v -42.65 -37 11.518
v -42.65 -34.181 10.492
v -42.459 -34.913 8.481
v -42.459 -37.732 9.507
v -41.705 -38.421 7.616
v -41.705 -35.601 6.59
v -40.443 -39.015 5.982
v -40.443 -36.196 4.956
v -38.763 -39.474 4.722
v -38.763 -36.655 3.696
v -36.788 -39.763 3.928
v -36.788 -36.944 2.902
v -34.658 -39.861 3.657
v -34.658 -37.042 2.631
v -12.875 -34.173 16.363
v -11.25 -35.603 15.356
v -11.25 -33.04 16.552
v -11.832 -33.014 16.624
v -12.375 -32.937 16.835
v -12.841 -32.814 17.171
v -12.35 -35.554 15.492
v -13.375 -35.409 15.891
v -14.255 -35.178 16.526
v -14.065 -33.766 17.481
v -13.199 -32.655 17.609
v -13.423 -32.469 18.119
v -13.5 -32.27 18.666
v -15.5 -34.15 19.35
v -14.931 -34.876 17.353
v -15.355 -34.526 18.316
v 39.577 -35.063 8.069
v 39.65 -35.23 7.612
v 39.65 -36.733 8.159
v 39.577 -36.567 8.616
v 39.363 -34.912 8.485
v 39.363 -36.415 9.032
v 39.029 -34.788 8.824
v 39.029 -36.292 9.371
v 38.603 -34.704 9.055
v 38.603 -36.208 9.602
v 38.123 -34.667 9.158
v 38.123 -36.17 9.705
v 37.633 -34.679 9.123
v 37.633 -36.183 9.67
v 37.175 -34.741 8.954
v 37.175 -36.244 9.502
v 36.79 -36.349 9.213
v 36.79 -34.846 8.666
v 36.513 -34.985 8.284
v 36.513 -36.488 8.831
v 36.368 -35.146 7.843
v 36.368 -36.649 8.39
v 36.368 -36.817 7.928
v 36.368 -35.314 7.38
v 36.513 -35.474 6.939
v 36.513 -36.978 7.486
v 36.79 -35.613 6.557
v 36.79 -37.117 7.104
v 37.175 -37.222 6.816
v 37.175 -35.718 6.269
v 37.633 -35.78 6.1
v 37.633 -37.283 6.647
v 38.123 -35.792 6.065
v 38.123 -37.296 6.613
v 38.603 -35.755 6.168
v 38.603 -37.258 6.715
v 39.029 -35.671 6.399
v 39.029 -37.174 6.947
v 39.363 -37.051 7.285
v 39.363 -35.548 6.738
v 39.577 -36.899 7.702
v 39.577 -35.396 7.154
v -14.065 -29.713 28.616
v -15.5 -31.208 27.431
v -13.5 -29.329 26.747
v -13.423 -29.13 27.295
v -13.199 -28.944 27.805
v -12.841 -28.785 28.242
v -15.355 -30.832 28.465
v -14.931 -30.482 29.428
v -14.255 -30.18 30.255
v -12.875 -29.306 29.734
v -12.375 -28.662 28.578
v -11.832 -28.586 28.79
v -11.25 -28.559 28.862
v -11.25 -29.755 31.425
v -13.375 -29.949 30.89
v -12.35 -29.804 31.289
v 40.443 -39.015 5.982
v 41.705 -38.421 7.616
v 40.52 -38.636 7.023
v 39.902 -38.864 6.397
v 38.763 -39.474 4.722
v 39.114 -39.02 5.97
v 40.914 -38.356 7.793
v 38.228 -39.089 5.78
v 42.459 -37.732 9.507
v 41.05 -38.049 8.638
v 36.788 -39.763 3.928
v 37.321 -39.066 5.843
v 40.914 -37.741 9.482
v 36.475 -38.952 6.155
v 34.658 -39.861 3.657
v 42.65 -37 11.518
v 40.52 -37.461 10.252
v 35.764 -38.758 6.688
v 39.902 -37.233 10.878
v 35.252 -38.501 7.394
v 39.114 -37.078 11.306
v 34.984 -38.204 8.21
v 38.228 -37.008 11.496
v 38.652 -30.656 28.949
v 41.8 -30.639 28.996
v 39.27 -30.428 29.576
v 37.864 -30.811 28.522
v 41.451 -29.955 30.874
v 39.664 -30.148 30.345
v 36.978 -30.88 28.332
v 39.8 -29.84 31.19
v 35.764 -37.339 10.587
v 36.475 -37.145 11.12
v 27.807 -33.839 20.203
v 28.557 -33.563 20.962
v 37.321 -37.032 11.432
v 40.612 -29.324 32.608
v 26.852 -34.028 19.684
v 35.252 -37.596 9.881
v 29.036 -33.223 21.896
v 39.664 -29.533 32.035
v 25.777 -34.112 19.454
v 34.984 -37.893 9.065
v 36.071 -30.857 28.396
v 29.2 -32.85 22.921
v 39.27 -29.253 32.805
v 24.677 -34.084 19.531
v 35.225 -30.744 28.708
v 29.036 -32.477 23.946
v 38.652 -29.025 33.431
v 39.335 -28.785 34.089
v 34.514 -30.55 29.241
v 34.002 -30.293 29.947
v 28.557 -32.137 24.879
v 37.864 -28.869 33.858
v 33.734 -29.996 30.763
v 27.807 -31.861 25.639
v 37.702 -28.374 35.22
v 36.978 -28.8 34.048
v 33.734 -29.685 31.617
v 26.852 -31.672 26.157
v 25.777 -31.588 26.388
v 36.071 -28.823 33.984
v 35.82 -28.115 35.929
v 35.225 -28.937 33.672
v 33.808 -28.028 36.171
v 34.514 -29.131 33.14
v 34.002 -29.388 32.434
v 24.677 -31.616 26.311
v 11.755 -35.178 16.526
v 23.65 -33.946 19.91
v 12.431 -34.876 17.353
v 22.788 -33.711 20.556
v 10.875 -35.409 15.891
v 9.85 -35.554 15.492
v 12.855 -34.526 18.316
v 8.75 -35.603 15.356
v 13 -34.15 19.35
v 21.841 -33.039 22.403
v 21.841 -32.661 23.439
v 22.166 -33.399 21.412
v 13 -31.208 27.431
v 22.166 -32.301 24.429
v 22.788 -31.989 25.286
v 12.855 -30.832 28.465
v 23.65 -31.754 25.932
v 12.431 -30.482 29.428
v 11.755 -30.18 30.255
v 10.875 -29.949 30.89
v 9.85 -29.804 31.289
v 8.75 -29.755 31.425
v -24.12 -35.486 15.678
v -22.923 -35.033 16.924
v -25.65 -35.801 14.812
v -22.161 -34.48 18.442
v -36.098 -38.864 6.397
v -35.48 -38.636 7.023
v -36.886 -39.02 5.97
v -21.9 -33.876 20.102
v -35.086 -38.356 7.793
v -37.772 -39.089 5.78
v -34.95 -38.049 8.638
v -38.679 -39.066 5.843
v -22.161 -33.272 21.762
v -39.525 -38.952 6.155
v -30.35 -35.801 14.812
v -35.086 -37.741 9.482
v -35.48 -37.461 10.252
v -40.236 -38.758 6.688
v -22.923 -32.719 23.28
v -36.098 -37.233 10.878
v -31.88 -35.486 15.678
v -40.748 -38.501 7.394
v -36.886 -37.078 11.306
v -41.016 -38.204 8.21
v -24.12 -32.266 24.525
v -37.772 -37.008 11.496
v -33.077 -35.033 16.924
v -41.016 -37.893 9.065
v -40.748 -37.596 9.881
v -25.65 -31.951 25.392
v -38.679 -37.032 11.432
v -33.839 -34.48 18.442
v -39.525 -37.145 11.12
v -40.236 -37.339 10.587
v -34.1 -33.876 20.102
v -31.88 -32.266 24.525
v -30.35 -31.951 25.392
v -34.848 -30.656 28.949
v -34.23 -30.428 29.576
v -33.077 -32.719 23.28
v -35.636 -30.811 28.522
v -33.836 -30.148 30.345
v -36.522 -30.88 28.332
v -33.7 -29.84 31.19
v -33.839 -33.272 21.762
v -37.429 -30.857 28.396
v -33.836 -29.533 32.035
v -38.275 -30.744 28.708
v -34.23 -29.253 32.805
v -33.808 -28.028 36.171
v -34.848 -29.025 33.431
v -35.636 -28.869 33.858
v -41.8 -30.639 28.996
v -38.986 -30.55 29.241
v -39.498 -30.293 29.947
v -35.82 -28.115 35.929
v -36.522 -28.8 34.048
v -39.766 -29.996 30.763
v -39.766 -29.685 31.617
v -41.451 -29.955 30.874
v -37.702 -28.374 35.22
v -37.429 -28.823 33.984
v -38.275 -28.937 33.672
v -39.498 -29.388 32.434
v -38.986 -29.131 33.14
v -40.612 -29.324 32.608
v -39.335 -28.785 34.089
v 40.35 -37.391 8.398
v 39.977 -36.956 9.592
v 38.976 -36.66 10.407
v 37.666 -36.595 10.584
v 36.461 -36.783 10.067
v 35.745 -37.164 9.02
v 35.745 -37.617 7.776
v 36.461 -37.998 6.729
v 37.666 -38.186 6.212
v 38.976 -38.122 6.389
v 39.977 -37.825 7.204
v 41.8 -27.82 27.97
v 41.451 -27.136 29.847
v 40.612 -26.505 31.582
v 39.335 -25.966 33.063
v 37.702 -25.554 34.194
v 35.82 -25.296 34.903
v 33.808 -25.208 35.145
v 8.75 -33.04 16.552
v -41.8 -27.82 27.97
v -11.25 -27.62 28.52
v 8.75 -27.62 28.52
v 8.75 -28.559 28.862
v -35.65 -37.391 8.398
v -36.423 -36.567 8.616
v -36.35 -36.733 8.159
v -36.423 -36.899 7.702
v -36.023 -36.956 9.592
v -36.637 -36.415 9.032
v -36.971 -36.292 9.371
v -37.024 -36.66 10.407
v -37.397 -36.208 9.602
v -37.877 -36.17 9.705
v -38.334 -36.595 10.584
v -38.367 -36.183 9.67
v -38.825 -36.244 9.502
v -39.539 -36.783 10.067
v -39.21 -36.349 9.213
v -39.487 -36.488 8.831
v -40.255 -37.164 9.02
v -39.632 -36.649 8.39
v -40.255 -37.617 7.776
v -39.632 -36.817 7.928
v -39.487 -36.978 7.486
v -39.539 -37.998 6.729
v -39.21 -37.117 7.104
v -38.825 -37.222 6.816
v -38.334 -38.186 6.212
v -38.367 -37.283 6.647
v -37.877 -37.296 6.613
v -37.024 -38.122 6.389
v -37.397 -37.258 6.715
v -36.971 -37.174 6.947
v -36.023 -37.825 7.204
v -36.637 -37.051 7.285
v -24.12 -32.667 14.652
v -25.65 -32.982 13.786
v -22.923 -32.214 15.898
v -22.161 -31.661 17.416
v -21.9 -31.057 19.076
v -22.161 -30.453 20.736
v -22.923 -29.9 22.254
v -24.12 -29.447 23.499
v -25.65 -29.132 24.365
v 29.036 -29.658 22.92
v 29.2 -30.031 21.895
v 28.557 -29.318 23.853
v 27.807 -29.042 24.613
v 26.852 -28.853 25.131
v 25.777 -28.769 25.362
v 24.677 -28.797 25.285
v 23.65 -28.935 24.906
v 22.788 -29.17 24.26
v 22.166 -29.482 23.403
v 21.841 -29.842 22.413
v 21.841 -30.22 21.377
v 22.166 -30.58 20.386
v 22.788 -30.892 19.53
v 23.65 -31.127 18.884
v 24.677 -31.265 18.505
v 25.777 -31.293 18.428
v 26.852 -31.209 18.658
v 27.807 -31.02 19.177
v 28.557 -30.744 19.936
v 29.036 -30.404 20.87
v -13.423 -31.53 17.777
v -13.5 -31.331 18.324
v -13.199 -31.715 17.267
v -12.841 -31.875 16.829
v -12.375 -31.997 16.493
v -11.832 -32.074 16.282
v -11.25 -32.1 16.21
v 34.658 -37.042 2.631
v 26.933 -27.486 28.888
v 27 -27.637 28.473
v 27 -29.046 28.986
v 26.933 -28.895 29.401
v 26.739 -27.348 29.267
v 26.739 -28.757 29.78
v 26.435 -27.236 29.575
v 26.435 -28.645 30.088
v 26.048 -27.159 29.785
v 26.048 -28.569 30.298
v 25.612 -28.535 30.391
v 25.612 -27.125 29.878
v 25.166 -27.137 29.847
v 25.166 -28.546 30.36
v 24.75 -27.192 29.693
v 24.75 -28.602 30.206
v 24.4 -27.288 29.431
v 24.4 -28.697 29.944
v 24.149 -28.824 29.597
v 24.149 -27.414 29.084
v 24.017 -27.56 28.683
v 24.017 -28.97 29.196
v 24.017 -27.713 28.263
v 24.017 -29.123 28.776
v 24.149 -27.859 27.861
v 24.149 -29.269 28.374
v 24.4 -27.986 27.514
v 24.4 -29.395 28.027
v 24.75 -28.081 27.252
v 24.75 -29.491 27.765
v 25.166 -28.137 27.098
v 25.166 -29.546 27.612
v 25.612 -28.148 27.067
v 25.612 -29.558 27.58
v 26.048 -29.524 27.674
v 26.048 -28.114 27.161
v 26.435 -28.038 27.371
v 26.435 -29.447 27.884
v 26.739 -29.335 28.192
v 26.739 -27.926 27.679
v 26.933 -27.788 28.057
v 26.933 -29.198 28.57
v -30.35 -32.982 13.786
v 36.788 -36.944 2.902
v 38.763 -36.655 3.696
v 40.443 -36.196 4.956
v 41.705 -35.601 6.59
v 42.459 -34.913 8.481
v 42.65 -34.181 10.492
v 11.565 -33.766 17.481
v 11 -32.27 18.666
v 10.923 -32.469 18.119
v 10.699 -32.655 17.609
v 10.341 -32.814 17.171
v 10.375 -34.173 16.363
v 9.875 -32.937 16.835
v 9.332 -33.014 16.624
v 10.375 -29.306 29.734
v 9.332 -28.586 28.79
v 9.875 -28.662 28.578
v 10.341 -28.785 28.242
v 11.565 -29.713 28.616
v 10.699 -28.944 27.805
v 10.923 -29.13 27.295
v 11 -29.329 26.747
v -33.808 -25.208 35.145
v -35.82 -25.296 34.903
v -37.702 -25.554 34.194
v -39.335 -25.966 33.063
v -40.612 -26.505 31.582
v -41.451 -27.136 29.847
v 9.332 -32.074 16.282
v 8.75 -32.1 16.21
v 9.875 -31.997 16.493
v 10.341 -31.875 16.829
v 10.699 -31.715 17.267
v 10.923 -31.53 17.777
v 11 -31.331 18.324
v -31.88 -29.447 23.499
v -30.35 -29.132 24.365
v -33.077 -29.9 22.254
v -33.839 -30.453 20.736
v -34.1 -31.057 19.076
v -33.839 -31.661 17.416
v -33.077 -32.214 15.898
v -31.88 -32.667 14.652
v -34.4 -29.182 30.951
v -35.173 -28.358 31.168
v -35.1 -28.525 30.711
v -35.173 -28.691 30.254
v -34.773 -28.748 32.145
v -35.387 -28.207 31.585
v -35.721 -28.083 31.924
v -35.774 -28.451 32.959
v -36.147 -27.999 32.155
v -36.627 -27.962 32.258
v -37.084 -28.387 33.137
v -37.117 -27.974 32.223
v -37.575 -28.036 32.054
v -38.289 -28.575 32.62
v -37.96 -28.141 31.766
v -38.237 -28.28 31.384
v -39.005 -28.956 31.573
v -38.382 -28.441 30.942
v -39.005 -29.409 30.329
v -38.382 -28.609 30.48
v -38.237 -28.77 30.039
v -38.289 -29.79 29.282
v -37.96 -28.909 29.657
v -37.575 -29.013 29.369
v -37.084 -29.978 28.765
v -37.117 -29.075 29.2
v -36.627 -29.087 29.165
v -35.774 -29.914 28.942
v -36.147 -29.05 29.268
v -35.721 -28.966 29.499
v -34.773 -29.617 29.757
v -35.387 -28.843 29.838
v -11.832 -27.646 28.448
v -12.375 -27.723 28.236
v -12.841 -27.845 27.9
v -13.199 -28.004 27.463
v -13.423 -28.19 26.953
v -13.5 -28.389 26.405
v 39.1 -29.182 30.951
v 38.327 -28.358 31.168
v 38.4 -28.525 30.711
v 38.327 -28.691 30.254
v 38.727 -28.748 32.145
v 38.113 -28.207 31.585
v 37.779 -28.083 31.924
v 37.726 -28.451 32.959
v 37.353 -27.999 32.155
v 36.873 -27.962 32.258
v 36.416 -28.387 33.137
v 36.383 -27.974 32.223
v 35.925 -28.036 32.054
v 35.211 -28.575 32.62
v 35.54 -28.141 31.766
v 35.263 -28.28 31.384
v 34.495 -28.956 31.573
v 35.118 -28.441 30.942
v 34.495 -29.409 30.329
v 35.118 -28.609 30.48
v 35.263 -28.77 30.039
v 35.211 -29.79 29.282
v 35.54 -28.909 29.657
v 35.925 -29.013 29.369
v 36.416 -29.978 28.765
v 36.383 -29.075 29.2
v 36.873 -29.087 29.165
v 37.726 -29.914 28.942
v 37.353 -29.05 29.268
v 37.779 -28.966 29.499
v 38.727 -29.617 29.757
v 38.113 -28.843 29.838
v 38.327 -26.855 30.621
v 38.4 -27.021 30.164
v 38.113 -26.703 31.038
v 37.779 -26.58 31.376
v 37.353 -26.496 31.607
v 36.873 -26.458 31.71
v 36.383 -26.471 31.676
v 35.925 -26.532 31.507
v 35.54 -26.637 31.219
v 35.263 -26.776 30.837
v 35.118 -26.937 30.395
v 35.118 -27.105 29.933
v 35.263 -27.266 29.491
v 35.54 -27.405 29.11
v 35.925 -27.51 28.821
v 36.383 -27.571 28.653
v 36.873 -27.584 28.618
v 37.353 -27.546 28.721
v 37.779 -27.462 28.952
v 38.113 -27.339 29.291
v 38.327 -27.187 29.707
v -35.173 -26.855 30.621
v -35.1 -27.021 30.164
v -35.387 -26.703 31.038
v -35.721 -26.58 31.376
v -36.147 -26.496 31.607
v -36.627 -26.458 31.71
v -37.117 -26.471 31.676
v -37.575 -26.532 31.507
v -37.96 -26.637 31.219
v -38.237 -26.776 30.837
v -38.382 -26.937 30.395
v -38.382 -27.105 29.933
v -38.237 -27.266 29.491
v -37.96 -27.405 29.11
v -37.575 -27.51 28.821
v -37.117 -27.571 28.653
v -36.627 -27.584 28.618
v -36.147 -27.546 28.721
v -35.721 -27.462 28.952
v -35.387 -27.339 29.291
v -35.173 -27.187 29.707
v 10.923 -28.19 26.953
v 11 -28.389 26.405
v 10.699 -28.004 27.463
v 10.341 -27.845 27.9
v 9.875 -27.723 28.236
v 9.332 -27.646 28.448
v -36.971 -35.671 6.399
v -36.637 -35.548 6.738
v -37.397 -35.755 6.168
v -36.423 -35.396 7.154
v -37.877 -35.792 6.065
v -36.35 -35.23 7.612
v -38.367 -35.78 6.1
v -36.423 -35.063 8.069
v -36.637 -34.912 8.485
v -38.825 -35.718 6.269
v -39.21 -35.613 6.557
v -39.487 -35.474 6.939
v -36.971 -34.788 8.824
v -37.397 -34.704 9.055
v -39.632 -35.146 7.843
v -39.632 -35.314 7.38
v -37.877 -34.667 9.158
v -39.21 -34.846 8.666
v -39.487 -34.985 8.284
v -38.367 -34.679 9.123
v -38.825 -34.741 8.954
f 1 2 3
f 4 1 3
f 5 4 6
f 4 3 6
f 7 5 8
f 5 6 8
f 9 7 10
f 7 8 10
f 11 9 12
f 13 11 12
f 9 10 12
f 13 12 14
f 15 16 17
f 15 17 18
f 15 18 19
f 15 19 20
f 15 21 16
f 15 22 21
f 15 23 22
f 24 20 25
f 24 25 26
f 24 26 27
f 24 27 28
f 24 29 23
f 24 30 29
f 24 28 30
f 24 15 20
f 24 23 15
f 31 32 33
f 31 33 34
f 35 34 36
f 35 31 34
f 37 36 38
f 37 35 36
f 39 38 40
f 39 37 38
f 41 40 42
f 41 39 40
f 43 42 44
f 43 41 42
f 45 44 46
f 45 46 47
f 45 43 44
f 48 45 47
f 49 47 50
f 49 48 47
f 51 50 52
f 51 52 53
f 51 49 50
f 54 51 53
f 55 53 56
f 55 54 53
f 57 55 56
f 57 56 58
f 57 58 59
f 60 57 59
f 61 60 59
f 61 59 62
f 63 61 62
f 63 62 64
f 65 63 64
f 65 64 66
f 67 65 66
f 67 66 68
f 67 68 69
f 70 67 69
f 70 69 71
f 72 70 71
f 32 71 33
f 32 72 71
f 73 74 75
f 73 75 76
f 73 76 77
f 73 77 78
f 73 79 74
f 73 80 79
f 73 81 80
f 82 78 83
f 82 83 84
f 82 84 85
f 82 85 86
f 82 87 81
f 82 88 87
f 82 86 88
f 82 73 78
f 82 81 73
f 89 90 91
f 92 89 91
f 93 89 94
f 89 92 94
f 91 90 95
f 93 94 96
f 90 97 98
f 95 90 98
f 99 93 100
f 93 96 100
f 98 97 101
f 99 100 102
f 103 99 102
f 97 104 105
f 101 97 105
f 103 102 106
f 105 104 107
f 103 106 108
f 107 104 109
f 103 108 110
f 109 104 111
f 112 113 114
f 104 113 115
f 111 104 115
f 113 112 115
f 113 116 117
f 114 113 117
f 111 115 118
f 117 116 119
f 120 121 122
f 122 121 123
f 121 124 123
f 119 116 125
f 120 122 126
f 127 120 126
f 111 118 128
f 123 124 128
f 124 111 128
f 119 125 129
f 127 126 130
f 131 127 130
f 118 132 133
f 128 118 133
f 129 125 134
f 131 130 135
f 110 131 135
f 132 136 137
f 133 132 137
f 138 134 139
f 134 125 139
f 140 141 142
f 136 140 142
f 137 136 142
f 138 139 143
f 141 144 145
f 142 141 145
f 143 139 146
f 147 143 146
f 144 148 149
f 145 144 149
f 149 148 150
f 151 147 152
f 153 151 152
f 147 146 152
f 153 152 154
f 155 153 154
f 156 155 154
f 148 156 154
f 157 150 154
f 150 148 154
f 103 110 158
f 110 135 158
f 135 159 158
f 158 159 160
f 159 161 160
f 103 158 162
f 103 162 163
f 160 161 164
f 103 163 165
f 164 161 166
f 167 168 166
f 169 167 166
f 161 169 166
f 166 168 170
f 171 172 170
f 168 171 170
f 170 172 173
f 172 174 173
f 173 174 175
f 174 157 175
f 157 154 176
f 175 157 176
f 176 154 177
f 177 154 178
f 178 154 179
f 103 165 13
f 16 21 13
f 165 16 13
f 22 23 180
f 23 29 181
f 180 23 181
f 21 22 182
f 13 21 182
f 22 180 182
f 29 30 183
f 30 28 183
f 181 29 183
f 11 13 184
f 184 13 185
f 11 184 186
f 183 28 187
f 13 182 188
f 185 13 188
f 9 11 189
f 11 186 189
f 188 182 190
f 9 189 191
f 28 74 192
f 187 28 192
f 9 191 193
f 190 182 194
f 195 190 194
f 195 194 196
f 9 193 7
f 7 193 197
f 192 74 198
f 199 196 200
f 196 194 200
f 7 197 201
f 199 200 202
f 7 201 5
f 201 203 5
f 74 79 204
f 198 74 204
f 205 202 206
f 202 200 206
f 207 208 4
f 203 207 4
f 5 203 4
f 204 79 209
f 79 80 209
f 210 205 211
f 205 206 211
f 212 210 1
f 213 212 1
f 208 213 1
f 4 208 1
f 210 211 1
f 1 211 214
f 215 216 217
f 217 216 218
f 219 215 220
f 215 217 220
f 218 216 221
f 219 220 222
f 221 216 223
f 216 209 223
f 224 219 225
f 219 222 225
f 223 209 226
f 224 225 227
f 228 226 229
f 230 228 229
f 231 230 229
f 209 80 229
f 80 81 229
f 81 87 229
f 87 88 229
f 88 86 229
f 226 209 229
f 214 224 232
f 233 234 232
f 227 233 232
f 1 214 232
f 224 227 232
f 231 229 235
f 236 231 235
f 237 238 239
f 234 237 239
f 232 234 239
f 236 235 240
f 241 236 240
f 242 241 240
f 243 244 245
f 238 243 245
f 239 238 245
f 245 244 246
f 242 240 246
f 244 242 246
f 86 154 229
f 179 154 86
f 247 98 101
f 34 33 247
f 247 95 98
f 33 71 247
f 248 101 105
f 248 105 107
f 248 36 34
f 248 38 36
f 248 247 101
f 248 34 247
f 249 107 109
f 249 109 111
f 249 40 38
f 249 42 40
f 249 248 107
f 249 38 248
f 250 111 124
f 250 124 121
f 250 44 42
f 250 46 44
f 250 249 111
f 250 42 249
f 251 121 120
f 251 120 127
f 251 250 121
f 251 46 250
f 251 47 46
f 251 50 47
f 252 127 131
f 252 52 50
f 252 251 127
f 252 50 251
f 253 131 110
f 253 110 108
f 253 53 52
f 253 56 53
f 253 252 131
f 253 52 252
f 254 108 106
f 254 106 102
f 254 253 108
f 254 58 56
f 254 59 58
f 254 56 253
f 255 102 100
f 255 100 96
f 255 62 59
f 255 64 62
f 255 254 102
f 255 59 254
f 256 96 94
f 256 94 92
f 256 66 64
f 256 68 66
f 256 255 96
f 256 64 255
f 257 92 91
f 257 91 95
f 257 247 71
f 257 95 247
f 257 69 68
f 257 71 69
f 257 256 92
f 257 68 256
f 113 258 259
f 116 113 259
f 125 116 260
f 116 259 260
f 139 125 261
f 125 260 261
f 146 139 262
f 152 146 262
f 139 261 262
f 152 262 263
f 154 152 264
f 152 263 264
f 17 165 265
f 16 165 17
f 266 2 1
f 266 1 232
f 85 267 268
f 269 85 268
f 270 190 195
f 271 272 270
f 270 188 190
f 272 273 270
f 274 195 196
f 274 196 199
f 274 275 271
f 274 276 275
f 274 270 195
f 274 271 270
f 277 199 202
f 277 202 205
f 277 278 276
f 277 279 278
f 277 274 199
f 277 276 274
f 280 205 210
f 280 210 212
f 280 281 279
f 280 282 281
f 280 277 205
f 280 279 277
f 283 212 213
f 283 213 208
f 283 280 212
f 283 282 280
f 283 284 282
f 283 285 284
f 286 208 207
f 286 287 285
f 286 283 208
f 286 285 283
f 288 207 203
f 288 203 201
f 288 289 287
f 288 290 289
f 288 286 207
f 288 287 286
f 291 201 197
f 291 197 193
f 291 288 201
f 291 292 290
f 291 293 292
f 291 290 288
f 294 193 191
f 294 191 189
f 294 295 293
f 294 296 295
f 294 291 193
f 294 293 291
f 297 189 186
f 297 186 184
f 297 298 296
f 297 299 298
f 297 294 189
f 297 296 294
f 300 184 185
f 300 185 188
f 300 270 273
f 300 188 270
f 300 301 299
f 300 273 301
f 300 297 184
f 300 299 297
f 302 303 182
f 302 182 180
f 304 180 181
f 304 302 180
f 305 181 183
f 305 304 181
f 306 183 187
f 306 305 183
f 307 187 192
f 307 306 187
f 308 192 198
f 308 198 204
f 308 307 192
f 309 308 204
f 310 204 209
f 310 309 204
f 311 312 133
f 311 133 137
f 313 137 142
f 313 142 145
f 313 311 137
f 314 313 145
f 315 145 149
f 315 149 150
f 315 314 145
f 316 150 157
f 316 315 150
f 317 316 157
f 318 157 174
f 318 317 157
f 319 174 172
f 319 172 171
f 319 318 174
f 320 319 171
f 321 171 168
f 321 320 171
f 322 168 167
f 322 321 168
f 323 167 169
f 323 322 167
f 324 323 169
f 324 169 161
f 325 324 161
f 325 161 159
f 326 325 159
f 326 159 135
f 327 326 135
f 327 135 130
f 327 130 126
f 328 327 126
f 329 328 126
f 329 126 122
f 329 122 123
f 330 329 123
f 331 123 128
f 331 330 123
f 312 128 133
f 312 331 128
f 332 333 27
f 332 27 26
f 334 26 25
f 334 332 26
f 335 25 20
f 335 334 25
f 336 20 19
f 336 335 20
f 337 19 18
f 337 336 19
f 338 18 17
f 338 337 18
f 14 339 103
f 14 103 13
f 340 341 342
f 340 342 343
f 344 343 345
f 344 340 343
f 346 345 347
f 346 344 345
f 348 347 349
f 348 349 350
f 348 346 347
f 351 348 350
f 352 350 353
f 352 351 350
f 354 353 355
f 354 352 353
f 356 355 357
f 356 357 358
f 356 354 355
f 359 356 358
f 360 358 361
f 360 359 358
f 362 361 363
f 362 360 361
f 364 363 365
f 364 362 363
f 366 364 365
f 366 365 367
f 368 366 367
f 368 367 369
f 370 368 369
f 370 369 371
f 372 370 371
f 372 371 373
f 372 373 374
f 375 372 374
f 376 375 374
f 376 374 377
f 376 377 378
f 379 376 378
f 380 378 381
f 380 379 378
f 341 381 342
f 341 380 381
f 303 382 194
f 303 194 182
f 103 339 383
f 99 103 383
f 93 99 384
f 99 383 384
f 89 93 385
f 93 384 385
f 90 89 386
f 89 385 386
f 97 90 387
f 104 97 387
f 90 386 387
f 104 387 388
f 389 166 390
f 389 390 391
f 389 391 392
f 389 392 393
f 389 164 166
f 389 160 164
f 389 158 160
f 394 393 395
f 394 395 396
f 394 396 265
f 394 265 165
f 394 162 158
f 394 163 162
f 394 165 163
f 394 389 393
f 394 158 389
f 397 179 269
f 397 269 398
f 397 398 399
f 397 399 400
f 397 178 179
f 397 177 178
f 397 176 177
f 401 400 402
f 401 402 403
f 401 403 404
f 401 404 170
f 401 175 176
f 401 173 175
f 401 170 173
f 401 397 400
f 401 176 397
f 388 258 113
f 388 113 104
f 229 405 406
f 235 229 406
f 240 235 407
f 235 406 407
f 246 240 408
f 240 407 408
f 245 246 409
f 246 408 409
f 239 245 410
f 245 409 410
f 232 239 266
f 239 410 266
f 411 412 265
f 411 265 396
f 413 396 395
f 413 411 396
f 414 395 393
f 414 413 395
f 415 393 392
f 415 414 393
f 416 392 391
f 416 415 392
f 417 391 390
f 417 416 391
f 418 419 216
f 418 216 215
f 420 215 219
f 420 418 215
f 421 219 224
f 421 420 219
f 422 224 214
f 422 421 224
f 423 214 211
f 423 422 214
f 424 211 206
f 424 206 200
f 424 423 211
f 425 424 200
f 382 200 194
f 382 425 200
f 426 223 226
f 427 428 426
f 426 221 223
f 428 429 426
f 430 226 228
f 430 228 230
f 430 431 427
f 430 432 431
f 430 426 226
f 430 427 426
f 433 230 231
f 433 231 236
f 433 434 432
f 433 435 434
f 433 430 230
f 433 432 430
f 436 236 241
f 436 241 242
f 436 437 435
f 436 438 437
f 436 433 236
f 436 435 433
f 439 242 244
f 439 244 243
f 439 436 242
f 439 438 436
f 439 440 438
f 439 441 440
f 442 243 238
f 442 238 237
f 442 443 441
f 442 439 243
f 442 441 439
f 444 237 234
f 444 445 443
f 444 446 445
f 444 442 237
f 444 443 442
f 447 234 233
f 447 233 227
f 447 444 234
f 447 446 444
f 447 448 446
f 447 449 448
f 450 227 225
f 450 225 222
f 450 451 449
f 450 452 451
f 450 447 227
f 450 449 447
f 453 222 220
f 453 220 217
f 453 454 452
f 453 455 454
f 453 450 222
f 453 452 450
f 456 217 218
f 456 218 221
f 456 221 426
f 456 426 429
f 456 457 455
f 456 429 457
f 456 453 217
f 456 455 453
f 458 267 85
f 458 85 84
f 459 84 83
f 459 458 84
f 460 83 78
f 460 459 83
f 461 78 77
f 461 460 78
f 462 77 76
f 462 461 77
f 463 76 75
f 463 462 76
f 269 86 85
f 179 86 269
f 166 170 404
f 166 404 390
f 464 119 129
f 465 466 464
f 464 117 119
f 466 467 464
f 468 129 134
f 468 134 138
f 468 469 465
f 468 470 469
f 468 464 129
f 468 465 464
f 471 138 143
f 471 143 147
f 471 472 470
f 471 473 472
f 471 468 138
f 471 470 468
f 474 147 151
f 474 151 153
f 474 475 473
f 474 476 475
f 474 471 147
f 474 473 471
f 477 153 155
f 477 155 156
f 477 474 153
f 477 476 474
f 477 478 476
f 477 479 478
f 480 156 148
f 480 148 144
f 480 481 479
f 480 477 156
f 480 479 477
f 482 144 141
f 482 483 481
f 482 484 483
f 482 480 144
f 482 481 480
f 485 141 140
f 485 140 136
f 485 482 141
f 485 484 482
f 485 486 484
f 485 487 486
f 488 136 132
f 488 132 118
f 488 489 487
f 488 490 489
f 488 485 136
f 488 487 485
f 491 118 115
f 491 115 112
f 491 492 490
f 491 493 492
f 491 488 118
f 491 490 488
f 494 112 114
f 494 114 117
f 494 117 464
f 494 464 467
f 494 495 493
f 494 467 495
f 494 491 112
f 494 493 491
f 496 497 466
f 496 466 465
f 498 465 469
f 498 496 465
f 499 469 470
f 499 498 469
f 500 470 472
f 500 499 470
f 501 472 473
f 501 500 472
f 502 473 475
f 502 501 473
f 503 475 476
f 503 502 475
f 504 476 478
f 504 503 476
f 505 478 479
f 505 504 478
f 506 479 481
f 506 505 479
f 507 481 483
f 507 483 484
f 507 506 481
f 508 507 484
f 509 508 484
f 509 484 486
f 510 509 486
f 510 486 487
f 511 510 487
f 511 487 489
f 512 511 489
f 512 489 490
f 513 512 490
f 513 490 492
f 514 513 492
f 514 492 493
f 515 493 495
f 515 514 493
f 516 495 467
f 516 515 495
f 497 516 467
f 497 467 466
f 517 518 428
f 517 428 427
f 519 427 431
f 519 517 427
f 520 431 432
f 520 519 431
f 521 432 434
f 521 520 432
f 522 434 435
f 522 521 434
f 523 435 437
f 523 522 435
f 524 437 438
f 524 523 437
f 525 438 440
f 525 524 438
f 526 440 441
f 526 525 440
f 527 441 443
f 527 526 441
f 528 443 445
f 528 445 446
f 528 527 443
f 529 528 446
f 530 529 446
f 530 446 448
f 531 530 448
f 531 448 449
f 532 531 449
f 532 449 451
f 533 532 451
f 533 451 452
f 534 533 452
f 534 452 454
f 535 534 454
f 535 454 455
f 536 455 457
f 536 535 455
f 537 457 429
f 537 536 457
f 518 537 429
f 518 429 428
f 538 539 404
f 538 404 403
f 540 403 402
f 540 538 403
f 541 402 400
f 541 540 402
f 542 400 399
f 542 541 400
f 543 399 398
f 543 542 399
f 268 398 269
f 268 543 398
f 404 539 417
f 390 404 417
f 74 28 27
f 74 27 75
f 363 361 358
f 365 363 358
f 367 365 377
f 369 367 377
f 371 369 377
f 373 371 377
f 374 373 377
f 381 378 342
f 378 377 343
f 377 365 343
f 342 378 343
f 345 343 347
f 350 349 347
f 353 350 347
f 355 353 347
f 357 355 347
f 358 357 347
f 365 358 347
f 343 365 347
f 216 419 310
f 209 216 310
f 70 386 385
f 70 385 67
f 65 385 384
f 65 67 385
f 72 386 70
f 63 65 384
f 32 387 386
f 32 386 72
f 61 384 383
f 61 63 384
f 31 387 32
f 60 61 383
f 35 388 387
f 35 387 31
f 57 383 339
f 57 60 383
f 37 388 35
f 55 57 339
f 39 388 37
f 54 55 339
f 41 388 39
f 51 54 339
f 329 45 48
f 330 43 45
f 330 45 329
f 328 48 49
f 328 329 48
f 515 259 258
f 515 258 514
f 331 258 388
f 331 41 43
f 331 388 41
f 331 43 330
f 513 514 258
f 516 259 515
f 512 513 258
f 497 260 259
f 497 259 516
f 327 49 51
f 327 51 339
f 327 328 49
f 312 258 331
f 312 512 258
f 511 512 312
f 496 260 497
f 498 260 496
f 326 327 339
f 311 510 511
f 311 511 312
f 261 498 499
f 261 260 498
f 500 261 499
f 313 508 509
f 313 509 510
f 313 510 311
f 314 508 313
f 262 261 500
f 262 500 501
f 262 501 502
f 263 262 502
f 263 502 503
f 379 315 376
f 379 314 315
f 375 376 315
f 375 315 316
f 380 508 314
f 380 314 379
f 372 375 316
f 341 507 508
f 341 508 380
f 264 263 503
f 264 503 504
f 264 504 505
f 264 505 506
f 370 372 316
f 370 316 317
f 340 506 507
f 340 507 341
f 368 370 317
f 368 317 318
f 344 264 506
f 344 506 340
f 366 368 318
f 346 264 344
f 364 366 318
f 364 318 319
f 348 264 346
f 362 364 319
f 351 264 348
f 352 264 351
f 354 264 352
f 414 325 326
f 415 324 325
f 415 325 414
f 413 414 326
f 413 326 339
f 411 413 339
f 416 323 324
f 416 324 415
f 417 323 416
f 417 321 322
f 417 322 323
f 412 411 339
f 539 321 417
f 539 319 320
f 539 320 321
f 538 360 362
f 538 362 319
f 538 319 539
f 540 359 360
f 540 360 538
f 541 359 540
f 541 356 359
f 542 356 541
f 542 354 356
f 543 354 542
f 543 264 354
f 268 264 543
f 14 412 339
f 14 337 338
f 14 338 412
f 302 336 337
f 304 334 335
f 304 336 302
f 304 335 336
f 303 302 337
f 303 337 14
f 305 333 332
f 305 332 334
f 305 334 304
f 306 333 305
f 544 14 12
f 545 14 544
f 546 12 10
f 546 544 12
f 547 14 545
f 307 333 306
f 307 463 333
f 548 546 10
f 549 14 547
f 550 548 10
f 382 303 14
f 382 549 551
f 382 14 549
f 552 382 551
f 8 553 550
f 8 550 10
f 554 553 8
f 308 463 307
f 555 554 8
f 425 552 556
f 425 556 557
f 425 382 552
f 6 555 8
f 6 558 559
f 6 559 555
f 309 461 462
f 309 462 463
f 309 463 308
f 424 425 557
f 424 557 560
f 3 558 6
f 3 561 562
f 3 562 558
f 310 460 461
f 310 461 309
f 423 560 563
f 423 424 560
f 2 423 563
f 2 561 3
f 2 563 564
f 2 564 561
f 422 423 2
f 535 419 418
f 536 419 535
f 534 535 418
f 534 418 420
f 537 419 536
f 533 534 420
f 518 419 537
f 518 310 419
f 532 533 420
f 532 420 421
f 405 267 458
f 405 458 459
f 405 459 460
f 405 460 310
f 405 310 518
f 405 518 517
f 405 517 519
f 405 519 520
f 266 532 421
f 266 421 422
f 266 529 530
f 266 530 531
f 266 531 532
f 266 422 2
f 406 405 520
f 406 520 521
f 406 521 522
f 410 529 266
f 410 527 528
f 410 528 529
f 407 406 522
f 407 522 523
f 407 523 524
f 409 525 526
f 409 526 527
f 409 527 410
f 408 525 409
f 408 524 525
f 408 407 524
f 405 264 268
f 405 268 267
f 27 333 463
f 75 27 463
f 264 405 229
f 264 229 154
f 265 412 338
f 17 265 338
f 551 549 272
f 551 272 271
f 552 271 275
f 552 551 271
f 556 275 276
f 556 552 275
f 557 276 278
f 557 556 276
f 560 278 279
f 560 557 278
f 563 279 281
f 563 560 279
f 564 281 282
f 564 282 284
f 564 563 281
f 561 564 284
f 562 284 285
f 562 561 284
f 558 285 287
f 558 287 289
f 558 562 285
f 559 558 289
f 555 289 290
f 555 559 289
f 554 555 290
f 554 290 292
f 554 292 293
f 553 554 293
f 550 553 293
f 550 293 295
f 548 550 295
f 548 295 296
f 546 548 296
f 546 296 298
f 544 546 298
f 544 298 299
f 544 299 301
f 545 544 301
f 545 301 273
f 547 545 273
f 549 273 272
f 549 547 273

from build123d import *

# Parameters (mm, degrees)
SKETCH033_R             = 1.65
SKETCH033_R_2           = 3.7
PAD001_DEPTH            = 3
CHAMFER001_SIZE         = 2
CHAMFER002_SIZE         = 1.4
SKETCH035_R             = 1.5
POCKET009_DEPTH         = 1.5
BODY005_PLACEMENT_ANGLE = 340


with BuildPart() as part:
    # Sketch033 → Pad001 (new body)
    with BuildSketch(Plane.XZ):
        with BuildLine():
            Line((-33.808366, 37.4), (33.808366, 37.4))
            ThreePointArc((41.8, 29.765194), (39.33458, 35.18452), (33.808366, 37.4))
            Line((41.8, 29.765194), (42.65, 11.165194))
            ThreePointArc((34.658366, 2.8), (40.442878, 5.273779), (42.65, 11.165194))
            Line((34.658366, 2.8), (-34.658366, 2.8))
            ThreePointArc((-42.65, 11.165194), (-40.442878, 5.273779), (-34.658366, 2.8))
            Line((-42.65, 11.165194), (-41.8, 29.765194))
            ThreePointArc((-33.808366, 37.4), (-39.33458, 35.18452), (-41.8, 29.765194))
        make_face()
        with Locations((-36.75, 32.1)):
            Circle(SKETCH033_R, mode=Mode.SUBTRACT)
        with Locations((36.75, 32.1)):
            Circle(SKETCH033_R, mode=Mode.SUBTRACT)
        with Locations((-38, 8.1)):
            Circle(SKETCH033_R, mode=Mode.SUBTRACT)
        with Locations((38, 8.1)):
            Circle(SKETCH033_R, mode=Mode.SUBTRACT)
        with Locations((25.5, 23.3)):
            Circle(SKETCH033_R_2, mode=Mode.SUBTRACT)
        with BuildLine():
            Line((-11.25, 30.35), (8.75, 30.35))
            ThreePointArc((11, 28.1), (10.34099, 29.69099), (8.75, 30.35))
            Line((11, 28.1), (11, 19.5))
            ThreePointArc((8.75, 17.25), (10.34099, 17.90901), (11, 19.5))
            Line((8.75, 17.25), (-11.25, 17.25))
            ThreePointArc((-13.5, 19.5), (-12.84099, 17.90901), (-11.25, 17.25))
            Line((-13.5, 19.5), (-13.5, 28.1))
            ThreePointArc((-11.25, 30.35), (-12.84099, 29.69099), (-13.5, 28.1))
        make_face(mode=Mode.SUBTRACT)
        with BuildLine():
            Line((-30.35, 25.929165), (-25.65, 25.929165))
            ThreePointArc((-25.65, 14.670835), (-21.9, 20.3), (-25.65, 25.929165))
            Line((-30.35, 14.670835), (-25.65, 14.670835))
            ThreePointArc((-30.35, 25.929165), (-34.1, 20.3), (-30.35, 14.670835))
        make_face(mode=Mode.SUBTRACT)
    extrude(amount=PAD001_DEPTH)

    # Chamfer001
    chamfer001_edges = [part.edges().sort_by_distance(p)[0] for p in [
        (-1.25, -3, 30.35),
    ]]
    chamfer(chamfer001_edges, length=CHAMFER001_SIZE)

    # Chamfer002
    chamfer002_edges = [part.edges().sort_by_distance(p)[0] for p in [
        (-38.4, -3, 32.1),
        (-39.65, -3, 8.1),
        (35.1, -3, 32.1),
        (36.35, -3, 8.1),
    ]]
    chamfer(chamfer002_edges, length=CHAMFER002_SIZE)

    # Sketch035 → Pocket009 (cut)
    with BuildSketch(Plane.XZ):
        with Locations((25.5, 30.3)):
            Circle(SKETCH035_R)
    extrude(amount=POCKET009_DEPTH, mode=Mode.SUBTRACT)


with BuildPart() as part_1:
    # Body005 placement: moved
    add(part.part.moved(Location((0, -38, 0))).rotate(Axis((0, -38, 0), (1, 0, 0)), BODY005_PLACEMENT_ANGLE))


solid = part_1.part
